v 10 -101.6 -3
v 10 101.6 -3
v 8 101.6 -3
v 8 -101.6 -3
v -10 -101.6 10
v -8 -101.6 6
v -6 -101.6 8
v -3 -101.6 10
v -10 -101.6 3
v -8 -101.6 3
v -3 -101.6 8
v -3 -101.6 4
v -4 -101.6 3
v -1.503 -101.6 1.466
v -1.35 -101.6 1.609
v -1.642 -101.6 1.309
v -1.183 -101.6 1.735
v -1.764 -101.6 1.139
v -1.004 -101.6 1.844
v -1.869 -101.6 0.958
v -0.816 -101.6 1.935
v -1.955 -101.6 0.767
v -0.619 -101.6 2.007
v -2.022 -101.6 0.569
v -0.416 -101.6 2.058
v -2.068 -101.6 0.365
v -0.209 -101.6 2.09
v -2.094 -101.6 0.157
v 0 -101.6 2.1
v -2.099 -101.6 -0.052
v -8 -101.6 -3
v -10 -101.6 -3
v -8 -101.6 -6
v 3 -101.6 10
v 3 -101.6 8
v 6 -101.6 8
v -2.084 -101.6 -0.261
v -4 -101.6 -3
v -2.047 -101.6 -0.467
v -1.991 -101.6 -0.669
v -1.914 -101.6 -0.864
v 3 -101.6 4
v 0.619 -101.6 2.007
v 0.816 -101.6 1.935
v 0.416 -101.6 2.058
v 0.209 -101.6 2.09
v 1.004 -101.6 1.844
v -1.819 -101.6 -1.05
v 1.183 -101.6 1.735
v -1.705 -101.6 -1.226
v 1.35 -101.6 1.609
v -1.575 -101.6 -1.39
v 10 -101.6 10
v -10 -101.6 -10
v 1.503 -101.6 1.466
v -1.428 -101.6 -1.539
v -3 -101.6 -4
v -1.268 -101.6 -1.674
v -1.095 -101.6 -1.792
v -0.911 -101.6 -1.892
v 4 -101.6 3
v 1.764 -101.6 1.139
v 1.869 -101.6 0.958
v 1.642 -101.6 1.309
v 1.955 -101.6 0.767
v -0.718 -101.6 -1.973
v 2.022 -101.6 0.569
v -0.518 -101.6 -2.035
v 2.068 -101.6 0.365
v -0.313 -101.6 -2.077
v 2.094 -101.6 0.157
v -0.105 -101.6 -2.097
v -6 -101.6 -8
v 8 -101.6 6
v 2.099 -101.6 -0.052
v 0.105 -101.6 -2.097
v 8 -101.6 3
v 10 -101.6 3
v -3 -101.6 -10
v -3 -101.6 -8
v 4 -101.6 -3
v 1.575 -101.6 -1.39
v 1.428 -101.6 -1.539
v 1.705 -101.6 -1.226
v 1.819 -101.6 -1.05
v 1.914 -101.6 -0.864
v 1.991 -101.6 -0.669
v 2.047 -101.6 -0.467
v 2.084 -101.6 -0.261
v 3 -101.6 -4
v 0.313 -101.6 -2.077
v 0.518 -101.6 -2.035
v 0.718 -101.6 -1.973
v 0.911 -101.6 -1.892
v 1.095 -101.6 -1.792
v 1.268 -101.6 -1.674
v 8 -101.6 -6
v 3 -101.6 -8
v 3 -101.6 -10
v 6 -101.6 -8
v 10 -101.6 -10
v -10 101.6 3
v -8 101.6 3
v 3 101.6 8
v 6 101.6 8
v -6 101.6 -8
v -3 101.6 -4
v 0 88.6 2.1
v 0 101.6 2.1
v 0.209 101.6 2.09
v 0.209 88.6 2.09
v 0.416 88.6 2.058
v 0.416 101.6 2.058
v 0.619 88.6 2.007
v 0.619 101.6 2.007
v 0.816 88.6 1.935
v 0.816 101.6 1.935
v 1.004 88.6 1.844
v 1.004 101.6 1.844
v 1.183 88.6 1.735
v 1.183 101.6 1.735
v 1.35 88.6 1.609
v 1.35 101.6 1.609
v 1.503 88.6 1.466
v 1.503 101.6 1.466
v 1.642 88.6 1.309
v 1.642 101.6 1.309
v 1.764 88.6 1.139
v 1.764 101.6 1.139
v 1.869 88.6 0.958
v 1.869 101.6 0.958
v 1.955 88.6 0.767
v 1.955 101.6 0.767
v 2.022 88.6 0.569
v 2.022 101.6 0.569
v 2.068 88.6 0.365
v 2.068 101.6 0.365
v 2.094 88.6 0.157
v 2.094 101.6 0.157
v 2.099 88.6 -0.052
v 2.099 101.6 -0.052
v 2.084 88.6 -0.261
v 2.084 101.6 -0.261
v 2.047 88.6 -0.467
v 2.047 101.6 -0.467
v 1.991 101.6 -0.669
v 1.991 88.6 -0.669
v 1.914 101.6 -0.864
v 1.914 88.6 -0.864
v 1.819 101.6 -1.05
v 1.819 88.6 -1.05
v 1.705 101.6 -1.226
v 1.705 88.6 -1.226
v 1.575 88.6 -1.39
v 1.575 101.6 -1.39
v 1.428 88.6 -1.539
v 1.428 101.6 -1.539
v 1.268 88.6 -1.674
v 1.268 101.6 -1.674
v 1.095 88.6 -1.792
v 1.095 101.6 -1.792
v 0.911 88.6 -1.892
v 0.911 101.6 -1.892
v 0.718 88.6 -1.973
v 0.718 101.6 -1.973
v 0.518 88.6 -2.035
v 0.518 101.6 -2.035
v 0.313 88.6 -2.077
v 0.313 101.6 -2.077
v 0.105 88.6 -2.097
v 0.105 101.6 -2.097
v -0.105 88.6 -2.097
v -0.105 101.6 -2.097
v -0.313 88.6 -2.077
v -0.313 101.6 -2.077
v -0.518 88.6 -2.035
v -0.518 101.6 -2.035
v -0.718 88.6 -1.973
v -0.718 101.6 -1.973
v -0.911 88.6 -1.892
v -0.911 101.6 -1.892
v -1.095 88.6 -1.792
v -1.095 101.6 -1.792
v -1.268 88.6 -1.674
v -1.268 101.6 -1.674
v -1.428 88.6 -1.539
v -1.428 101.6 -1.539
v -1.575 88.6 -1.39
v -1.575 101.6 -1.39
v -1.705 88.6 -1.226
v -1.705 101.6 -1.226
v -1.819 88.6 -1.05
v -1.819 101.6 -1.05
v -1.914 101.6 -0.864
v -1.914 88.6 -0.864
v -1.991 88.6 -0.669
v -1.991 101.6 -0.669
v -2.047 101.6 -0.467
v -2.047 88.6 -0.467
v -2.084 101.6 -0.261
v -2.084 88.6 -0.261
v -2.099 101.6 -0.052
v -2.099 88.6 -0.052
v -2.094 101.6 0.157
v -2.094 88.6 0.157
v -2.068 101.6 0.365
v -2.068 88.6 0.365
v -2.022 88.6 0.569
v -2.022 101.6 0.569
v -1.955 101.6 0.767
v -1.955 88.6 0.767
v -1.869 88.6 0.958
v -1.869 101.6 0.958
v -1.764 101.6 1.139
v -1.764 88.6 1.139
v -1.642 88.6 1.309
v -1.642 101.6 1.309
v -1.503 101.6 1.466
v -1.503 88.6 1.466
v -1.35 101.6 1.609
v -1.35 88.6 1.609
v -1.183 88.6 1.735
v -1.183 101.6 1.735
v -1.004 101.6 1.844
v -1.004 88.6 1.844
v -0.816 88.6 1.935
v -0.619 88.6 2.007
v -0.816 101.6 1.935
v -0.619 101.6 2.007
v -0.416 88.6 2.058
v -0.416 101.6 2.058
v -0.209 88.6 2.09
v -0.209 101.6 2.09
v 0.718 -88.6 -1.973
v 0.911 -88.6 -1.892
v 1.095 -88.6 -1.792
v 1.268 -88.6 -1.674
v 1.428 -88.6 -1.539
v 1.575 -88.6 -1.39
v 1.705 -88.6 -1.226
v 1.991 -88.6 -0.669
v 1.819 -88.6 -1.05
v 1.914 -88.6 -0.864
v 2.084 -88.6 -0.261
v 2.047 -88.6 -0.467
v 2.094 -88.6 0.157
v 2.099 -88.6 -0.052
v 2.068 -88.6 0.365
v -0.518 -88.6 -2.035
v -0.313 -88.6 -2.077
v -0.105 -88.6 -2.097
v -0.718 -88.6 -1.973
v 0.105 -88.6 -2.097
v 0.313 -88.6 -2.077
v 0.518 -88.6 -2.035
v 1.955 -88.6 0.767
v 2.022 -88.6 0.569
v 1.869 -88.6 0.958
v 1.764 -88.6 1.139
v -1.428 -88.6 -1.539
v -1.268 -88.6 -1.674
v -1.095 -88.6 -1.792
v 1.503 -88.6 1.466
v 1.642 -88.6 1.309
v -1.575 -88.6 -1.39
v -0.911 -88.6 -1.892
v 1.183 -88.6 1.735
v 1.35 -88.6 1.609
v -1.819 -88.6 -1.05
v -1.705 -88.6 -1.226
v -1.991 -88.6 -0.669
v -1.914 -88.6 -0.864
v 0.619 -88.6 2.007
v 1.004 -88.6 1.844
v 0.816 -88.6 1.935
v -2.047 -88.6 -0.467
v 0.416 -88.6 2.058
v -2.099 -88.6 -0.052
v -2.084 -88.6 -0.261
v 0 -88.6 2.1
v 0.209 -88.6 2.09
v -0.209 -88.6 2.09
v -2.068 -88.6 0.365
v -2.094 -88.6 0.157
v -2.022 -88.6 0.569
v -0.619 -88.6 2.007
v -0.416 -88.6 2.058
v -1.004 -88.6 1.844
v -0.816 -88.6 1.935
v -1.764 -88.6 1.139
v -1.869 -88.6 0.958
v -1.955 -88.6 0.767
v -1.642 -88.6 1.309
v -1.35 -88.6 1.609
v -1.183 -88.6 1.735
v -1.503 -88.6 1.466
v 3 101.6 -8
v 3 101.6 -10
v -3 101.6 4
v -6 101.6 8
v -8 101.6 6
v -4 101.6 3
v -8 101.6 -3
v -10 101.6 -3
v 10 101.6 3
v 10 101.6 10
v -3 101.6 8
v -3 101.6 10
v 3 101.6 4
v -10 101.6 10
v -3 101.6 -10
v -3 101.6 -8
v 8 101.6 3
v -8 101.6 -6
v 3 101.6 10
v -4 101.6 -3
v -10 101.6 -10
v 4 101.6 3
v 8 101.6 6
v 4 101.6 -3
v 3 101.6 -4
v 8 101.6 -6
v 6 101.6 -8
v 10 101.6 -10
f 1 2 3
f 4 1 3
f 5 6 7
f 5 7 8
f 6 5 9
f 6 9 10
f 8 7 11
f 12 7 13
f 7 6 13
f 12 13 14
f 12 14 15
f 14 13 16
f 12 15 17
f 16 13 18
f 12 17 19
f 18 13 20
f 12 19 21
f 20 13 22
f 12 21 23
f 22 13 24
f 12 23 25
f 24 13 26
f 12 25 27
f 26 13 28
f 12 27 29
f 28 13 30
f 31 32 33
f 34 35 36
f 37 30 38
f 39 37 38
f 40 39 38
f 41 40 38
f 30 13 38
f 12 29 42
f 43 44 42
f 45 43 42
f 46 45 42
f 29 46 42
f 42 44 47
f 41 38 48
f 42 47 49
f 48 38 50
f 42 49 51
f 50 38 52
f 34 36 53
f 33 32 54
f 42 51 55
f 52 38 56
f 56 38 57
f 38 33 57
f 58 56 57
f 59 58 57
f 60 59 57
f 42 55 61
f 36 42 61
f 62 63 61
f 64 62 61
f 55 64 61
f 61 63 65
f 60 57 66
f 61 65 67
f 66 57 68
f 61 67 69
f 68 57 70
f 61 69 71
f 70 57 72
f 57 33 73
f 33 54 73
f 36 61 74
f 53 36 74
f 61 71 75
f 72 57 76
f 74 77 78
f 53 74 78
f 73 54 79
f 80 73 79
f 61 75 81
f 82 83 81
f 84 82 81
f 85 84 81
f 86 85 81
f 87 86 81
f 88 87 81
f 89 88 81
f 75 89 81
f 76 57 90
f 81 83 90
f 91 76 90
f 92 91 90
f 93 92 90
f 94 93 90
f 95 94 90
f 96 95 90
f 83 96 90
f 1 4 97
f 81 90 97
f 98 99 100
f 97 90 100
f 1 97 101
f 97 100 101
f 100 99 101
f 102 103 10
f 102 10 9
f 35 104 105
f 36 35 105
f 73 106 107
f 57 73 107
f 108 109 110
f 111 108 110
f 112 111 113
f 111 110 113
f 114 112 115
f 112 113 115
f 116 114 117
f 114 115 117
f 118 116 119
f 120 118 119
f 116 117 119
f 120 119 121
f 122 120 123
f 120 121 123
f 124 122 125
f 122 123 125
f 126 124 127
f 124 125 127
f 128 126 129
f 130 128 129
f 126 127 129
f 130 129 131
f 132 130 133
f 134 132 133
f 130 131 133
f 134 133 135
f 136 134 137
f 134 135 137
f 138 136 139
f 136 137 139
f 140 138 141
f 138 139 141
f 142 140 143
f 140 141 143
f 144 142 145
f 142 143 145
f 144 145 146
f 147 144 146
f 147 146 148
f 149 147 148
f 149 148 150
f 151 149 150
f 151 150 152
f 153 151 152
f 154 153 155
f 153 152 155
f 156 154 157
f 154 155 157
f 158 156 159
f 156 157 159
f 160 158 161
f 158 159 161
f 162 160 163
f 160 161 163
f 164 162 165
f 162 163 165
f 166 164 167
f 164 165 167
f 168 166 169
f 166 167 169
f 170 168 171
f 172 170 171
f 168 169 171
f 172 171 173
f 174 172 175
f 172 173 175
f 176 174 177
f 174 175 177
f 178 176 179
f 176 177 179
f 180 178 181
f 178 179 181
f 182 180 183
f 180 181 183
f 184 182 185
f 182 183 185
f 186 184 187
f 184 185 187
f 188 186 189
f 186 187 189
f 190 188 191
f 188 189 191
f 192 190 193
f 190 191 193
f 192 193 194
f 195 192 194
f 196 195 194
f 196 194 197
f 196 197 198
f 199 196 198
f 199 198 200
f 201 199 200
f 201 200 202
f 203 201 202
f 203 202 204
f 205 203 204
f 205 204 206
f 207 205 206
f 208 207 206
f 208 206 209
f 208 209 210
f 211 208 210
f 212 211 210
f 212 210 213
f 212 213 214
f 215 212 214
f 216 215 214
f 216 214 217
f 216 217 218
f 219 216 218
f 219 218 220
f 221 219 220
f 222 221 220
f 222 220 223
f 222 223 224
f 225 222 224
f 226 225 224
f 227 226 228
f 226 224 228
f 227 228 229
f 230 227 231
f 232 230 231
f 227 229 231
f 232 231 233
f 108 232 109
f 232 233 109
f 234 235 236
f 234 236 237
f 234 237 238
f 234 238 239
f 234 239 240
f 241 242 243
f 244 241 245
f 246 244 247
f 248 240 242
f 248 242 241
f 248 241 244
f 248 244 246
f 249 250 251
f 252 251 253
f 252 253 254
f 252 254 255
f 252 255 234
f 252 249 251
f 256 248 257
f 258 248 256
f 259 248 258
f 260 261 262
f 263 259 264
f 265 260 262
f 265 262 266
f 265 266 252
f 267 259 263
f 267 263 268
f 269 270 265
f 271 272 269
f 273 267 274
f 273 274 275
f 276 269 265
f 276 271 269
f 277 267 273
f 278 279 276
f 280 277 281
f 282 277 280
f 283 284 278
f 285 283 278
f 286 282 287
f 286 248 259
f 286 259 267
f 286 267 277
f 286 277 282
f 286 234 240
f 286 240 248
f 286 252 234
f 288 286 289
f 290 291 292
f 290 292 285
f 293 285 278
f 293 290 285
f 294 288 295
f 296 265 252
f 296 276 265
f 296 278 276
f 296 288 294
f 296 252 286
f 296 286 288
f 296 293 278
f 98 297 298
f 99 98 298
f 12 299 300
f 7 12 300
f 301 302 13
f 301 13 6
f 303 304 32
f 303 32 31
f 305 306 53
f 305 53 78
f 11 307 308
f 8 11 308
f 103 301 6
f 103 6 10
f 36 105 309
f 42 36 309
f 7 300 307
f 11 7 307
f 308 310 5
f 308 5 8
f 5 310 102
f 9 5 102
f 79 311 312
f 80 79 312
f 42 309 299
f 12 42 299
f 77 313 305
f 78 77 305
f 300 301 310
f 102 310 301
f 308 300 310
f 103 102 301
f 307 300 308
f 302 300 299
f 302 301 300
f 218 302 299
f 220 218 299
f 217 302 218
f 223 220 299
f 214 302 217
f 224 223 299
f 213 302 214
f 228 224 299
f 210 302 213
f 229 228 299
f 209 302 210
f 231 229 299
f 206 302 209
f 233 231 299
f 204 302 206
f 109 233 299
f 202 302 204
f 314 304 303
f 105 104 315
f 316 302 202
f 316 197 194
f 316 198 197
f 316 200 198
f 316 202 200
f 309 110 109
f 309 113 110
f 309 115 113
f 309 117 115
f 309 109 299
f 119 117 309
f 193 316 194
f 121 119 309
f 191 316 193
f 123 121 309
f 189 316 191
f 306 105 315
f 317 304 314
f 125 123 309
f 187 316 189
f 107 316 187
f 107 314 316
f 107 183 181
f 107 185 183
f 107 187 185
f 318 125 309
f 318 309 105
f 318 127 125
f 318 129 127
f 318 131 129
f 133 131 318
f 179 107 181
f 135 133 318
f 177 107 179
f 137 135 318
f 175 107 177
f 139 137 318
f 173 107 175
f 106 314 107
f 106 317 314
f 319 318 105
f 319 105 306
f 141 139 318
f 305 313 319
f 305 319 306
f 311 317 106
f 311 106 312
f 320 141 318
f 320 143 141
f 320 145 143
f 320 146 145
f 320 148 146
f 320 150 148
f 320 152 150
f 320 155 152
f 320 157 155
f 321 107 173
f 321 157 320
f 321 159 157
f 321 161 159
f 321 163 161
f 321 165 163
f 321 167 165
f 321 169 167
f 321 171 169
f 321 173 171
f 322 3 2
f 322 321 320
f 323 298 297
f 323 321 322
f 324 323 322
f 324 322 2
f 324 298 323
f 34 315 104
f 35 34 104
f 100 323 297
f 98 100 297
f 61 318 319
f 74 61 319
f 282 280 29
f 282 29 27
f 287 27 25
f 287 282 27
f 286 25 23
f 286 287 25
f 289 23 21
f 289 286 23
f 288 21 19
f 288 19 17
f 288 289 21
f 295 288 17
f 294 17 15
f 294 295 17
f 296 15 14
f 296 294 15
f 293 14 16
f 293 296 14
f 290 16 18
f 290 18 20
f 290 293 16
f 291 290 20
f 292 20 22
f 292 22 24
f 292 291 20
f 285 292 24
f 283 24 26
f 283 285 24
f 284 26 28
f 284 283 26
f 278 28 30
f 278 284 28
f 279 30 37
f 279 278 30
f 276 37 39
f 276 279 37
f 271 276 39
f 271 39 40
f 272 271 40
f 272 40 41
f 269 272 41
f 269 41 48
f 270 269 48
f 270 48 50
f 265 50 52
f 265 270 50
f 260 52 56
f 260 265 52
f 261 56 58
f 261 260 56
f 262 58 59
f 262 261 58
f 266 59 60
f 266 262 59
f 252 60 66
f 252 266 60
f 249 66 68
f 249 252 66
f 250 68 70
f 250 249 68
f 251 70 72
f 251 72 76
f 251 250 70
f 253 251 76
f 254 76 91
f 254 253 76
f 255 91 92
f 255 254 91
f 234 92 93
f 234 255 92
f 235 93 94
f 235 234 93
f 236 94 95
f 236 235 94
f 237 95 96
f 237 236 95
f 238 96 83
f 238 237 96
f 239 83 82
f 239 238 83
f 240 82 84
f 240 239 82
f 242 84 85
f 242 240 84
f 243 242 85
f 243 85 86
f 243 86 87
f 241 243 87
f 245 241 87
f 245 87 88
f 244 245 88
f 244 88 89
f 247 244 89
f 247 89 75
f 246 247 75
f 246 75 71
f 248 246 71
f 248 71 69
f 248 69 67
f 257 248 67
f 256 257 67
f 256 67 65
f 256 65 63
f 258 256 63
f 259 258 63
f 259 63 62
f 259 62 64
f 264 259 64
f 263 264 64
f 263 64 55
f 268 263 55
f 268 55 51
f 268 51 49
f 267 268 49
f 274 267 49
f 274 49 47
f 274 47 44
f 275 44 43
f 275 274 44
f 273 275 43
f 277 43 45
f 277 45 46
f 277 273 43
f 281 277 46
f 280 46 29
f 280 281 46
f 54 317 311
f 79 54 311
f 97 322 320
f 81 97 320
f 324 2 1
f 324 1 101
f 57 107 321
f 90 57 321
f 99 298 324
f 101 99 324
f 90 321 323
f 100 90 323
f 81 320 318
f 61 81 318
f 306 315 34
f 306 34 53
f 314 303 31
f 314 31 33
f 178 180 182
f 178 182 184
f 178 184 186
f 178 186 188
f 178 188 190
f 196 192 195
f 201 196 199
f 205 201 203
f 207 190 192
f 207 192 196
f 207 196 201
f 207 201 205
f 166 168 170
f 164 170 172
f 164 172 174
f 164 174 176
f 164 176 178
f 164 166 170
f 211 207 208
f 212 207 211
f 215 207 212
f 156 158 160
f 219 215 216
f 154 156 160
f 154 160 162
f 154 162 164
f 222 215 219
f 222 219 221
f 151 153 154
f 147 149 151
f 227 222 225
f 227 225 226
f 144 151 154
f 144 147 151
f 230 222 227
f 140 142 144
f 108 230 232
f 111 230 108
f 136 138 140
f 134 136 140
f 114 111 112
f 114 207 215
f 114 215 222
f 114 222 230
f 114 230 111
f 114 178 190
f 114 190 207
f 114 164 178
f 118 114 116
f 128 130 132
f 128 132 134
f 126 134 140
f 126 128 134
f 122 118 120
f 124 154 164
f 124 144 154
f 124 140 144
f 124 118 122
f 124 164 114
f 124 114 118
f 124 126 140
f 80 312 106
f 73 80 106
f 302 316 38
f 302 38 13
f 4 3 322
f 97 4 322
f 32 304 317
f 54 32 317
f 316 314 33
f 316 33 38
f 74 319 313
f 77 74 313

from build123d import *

# Parameters (mm, degrees)
SKETCH1_W           = 20
SKETCH1_H           = 20
BOSS_EXTRUDE1_DEPTH = 101.6
CUT_EXTRUDE1_DEPTH  = 203.2
SKETCH3_R           = 2.1
CUT_EXTRUDE2_DEPTH  = 13
CUT_EXTRUDE3_START  = -13
SKETCH4_R           = 2.1
CUT_EXTRUDE3_DEPTH  = 13


with BuildPart() as part:
    # Sketch1 → Boss-Extrude1 (new, symmetric)
    with BuildSketch(Plane(origin=(0, 0, 0), x_dir=(1, 0, 0), z_dir=(0, 1, 0))):
        Rectangle(SKETCH1_W, SKETCH1_H)
    extrude(amount=BOSS_EXTRUDE1_DEPTH, both=True)

    # Sketch2 → Cut-Extrude1 (cut)
    with BuildSketch(Plane(origin=(0, 101.6, 0), x_dir=(1, 0, 0), z_dir=(0, 1, 0))):
        Polygon((-10, -3), (-10, 3), (-8, 3), (-8, 6), (-4.000000001, 3), (-4.000000001, -3), (-8, -6), (-8, -3), align=None)
        Polygon((3, 4.000000001), (6, 8), (3, 8), (3, 10), (-3, 10), (-3, 8), (-6, 8), (-3, 4.000000001), align=None)
        Polygon((4.000000001, -3), (8, -6), (8, -3), (10, -3), (10, 3), (8, 3), (8, 6), (4.000000001, 3), align=None)
        Polygon((-3, -4.000000001), (-6, -8), (-3, -8), (-3, -10), (3, -10), (3, -8), (6, -8), (3, -4.000000001), align=None)
    extrude(amount=-CUT_EXTRUDE1_DEPTH, mode=Mode.SUBTRACT)

    # Sketch3 → Cut-Extrude2 (cut)
    with BuildSketch(Plane(origin=(0, 101.6, 0), x_dir=(1, 0, 0), z_dir=(0, 1, 0))):
        with Locations(Location((0, 0, 0), (0, 0, 270))):
            Circle(SKETCH3_R)
    extrude(amount=-CUT_EXTRUDE2_DEPTH, mode=Mode.SUBTRACT)

    # Sketch4 → Cut-Extrude3 (cut)
    with BuildSketch(Plane.XZ.offset(101.6).offset(CUT_EXTRUDE3_START)):
        with Locations(Location((0, 0, 0), (0, 0, 90))):
            Circle(SKETCH4_R)
    extrude(amount=CUT_EXTRUDE3_DEPTH, mode=Mode.SUBTRACT)


solid = part.part
